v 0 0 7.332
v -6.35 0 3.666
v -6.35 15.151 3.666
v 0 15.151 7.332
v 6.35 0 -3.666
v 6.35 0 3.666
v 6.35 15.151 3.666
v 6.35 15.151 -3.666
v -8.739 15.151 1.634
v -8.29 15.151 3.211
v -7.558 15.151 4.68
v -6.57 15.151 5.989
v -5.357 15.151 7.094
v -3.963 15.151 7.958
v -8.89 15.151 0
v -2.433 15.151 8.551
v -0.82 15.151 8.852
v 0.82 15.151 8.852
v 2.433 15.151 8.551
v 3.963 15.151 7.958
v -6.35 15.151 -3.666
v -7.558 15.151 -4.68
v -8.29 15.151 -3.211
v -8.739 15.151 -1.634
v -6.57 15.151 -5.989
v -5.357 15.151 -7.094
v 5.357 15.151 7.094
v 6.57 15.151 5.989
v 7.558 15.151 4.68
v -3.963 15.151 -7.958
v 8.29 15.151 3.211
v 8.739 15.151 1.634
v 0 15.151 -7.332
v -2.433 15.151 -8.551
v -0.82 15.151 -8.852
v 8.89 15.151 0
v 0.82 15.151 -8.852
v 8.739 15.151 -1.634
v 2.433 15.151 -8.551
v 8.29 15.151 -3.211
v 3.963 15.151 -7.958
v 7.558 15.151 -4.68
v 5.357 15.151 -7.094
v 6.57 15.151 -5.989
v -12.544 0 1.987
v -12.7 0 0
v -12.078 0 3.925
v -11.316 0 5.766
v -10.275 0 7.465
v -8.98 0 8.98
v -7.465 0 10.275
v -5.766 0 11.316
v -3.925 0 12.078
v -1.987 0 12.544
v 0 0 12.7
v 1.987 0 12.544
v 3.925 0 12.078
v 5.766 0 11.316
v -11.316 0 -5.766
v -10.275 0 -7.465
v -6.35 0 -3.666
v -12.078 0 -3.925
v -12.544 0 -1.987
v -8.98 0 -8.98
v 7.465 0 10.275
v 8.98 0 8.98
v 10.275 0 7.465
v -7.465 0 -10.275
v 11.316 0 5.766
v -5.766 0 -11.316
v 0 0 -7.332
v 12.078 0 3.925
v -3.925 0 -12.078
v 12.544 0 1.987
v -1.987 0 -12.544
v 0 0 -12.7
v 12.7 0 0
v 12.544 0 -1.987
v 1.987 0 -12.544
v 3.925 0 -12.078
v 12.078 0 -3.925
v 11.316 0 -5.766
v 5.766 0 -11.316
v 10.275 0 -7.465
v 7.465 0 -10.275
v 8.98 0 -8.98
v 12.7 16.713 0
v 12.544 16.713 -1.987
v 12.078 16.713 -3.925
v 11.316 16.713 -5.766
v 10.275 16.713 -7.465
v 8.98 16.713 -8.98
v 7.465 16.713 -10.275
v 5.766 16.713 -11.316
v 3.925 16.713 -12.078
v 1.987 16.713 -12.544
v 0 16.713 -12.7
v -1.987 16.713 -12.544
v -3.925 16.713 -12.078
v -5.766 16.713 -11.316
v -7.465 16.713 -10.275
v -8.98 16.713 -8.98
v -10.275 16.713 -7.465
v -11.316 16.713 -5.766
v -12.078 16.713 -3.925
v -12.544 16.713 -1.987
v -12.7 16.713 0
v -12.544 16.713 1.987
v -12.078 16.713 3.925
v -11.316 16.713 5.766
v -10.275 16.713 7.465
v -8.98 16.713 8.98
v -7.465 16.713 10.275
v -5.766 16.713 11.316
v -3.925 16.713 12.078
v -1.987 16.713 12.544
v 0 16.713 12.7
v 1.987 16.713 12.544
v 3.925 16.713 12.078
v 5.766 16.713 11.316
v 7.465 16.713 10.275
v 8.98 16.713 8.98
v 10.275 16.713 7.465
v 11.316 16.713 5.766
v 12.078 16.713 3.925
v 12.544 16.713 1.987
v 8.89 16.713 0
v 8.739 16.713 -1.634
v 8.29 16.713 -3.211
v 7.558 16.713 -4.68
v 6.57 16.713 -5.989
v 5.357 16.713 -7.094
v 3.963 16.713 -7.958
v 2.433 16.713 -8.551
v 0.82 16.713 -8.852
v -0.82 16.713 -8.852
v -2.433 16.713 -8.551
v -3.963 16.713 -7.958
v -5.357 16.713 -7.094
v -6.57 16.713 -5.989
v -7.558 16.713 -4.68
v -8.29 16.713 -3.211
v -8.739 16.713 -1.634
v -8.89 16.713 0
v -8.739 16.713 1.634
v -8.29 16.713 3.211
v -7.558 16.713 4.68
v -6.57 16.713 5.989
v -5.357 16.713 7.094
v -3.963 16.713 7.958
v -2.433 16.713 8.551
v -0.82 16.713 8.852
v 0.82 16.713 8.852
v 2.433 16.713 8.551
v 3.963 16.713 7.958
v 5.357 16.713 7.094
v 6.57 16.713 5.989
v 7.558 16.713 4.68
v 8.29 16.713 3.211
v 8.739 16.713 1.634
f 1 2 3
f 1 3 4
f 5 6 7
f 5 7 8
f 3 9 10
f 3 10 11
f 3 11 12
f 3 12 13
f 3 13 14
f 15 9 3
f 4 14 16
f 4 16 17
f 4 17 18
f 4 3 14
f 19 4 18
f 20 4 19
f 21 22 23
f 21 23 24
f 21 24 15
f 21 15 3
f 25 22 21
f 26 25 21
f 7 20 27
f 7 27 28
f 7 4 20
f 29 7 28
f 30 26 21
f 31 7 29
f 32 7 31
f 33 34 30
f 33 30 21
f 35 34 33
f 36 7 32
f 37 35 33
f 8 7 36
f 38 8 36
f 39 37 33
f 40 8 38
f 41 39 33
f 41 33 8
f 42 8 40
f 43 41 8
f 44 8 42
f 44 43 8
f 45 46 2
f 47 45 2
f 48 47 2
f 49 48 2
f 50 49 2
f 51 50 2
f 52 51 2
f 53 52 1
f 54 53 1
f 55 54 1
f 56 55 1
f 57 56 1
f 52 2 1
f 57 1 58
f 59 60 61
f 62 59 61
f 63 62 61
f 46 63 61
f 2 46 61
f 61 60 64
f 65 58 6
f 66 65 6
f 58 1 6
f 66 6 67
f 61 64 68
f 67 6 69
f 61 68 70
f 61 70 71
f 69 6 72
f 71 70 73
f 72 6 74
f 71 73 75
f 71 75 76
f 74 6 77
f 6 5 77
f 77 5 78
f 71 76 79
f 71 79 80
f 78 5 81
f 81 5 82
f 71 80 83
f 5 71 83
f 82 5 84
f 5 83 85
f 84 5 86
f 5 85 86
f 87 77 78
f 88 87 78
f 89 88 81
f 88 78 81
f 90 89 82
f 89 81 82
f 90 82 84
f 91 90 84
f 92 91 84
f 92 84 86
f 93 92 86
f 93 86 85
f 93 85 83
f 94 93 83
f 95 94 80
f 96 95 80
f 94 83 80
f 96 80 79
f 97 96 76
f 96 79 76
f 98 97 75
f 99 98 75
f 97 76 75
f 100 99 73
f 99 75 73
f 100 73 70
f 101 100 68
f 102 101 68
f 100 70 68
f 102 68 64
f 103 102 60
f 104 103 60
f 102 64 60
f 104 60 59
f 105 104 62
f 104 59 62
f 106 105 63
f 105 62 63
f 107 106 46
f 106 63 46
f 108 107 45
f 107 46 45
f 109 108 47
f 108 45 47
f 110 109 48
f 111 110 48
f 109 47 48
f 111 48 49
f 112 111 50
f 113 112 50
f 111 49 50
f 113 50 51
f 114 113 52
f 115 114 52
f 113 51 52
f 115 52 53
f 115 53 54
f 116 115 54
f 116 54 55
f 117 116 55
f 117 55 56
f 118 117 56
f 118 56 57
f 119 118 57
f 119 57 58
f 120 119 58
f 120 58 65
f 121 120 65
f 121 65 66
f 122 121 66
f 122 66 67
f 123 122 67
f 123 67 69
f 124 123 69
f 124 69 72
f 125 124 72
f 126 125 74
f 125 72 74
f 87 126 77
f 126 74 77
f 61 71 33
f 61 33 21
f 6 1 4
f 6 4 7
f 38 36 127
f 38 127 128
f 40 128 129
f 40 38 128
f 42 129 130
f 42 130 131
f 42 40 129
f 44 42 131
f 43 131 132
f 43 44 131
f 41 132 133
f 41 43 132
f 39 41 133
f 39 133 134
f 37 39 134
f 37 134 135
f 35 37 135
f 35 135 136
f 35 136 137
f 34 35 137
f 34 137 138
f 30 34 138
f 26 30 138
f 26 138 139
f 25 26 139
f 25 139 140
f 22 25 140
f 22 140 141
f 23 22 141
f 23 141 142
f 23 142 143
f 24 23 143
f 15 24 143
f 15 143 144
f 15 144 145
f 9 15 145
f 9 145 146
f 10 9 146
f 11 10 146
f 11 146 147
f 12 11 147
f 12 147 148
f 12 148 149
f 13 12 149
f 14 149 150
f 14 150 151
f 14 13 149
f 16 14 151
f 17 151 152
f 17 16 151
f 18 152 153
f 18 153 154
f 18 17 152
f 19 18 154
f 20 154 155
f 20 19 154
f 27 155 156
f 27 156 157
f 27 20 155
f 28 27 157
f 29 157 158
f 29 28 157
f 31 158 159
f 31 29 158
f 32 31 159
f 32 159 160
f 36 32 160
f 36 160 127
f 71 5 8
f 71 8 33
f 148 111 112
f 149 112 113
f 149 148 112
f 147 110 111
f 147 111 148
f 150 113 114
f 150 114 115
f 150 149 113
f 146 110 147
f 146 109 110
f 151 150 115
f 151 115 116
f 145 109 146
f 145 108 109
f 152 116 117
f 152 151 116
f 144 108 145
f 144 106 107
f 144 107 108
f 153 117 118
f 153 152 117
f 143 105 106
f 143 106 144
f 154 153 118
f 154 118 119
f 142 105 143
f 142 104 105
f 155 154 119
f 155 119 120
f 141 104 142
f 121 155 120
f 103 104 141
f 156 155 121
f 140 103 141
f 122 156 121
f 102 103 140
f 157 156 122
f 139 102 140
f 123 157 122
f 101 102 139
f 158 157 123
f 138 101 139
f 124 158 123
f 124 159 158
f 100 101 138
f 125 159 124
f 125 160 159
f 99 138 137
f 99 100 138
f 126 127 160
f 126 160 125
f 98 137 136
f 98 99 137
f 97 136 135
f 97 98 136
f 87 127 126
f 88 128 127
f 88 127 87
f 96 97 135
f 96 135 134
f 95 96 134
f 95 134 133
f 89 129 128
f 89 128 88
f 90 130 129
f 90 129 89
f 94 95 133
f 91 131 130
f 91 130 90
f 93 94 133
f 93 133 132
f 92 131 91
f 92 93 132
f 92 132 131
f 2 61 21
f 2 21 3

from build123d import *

# Parameters (mm, degrees)
SKETCH1_R           = 12.7
SKETCH1_R_2         = 8.89
BOSS_EXTRUDE1_DEPTH = 16.7132
SKETCH1_3_R         = 8.89
BOSS_EXTRUDE2_DEPTH = 15.1511


with BuildPart() as part:
    # Sketch1 → Boss-Extrude1 (new body)
    with BuildSketch(Plane(origin=(0, 0, 0), x_dir=(1, 0, 0), z_dir=(0, 1, 0))):
        Circle(SKETCH1_R)
        Circle(SKETCH1_R_2, mode=Mode.SUBTRACT)
    extrude(amount=BOSS_EXTRUDE1_DEPTH)

    # Sketch1<3> → Boss-Extrude2 (add)
    with BuildSketch(Plane(origin=(0, 0, 0), x_dir=(1, 0, 0), z_dir=(0, 1, 0))):
        Circle(SKETCH1_3_R)
        Polygon((0, 7.332348419), (6.35, 3.666174209), (6.35, -3.666174209), (0, -7.332348419), (-6.35, -3.666174209), (-6.35, 3.666174209), align=None, mode=Mode.SUBTRACT)
    extrude(amount=BOSS_EXTRUDE2_DEPTH)


solid = part.part
